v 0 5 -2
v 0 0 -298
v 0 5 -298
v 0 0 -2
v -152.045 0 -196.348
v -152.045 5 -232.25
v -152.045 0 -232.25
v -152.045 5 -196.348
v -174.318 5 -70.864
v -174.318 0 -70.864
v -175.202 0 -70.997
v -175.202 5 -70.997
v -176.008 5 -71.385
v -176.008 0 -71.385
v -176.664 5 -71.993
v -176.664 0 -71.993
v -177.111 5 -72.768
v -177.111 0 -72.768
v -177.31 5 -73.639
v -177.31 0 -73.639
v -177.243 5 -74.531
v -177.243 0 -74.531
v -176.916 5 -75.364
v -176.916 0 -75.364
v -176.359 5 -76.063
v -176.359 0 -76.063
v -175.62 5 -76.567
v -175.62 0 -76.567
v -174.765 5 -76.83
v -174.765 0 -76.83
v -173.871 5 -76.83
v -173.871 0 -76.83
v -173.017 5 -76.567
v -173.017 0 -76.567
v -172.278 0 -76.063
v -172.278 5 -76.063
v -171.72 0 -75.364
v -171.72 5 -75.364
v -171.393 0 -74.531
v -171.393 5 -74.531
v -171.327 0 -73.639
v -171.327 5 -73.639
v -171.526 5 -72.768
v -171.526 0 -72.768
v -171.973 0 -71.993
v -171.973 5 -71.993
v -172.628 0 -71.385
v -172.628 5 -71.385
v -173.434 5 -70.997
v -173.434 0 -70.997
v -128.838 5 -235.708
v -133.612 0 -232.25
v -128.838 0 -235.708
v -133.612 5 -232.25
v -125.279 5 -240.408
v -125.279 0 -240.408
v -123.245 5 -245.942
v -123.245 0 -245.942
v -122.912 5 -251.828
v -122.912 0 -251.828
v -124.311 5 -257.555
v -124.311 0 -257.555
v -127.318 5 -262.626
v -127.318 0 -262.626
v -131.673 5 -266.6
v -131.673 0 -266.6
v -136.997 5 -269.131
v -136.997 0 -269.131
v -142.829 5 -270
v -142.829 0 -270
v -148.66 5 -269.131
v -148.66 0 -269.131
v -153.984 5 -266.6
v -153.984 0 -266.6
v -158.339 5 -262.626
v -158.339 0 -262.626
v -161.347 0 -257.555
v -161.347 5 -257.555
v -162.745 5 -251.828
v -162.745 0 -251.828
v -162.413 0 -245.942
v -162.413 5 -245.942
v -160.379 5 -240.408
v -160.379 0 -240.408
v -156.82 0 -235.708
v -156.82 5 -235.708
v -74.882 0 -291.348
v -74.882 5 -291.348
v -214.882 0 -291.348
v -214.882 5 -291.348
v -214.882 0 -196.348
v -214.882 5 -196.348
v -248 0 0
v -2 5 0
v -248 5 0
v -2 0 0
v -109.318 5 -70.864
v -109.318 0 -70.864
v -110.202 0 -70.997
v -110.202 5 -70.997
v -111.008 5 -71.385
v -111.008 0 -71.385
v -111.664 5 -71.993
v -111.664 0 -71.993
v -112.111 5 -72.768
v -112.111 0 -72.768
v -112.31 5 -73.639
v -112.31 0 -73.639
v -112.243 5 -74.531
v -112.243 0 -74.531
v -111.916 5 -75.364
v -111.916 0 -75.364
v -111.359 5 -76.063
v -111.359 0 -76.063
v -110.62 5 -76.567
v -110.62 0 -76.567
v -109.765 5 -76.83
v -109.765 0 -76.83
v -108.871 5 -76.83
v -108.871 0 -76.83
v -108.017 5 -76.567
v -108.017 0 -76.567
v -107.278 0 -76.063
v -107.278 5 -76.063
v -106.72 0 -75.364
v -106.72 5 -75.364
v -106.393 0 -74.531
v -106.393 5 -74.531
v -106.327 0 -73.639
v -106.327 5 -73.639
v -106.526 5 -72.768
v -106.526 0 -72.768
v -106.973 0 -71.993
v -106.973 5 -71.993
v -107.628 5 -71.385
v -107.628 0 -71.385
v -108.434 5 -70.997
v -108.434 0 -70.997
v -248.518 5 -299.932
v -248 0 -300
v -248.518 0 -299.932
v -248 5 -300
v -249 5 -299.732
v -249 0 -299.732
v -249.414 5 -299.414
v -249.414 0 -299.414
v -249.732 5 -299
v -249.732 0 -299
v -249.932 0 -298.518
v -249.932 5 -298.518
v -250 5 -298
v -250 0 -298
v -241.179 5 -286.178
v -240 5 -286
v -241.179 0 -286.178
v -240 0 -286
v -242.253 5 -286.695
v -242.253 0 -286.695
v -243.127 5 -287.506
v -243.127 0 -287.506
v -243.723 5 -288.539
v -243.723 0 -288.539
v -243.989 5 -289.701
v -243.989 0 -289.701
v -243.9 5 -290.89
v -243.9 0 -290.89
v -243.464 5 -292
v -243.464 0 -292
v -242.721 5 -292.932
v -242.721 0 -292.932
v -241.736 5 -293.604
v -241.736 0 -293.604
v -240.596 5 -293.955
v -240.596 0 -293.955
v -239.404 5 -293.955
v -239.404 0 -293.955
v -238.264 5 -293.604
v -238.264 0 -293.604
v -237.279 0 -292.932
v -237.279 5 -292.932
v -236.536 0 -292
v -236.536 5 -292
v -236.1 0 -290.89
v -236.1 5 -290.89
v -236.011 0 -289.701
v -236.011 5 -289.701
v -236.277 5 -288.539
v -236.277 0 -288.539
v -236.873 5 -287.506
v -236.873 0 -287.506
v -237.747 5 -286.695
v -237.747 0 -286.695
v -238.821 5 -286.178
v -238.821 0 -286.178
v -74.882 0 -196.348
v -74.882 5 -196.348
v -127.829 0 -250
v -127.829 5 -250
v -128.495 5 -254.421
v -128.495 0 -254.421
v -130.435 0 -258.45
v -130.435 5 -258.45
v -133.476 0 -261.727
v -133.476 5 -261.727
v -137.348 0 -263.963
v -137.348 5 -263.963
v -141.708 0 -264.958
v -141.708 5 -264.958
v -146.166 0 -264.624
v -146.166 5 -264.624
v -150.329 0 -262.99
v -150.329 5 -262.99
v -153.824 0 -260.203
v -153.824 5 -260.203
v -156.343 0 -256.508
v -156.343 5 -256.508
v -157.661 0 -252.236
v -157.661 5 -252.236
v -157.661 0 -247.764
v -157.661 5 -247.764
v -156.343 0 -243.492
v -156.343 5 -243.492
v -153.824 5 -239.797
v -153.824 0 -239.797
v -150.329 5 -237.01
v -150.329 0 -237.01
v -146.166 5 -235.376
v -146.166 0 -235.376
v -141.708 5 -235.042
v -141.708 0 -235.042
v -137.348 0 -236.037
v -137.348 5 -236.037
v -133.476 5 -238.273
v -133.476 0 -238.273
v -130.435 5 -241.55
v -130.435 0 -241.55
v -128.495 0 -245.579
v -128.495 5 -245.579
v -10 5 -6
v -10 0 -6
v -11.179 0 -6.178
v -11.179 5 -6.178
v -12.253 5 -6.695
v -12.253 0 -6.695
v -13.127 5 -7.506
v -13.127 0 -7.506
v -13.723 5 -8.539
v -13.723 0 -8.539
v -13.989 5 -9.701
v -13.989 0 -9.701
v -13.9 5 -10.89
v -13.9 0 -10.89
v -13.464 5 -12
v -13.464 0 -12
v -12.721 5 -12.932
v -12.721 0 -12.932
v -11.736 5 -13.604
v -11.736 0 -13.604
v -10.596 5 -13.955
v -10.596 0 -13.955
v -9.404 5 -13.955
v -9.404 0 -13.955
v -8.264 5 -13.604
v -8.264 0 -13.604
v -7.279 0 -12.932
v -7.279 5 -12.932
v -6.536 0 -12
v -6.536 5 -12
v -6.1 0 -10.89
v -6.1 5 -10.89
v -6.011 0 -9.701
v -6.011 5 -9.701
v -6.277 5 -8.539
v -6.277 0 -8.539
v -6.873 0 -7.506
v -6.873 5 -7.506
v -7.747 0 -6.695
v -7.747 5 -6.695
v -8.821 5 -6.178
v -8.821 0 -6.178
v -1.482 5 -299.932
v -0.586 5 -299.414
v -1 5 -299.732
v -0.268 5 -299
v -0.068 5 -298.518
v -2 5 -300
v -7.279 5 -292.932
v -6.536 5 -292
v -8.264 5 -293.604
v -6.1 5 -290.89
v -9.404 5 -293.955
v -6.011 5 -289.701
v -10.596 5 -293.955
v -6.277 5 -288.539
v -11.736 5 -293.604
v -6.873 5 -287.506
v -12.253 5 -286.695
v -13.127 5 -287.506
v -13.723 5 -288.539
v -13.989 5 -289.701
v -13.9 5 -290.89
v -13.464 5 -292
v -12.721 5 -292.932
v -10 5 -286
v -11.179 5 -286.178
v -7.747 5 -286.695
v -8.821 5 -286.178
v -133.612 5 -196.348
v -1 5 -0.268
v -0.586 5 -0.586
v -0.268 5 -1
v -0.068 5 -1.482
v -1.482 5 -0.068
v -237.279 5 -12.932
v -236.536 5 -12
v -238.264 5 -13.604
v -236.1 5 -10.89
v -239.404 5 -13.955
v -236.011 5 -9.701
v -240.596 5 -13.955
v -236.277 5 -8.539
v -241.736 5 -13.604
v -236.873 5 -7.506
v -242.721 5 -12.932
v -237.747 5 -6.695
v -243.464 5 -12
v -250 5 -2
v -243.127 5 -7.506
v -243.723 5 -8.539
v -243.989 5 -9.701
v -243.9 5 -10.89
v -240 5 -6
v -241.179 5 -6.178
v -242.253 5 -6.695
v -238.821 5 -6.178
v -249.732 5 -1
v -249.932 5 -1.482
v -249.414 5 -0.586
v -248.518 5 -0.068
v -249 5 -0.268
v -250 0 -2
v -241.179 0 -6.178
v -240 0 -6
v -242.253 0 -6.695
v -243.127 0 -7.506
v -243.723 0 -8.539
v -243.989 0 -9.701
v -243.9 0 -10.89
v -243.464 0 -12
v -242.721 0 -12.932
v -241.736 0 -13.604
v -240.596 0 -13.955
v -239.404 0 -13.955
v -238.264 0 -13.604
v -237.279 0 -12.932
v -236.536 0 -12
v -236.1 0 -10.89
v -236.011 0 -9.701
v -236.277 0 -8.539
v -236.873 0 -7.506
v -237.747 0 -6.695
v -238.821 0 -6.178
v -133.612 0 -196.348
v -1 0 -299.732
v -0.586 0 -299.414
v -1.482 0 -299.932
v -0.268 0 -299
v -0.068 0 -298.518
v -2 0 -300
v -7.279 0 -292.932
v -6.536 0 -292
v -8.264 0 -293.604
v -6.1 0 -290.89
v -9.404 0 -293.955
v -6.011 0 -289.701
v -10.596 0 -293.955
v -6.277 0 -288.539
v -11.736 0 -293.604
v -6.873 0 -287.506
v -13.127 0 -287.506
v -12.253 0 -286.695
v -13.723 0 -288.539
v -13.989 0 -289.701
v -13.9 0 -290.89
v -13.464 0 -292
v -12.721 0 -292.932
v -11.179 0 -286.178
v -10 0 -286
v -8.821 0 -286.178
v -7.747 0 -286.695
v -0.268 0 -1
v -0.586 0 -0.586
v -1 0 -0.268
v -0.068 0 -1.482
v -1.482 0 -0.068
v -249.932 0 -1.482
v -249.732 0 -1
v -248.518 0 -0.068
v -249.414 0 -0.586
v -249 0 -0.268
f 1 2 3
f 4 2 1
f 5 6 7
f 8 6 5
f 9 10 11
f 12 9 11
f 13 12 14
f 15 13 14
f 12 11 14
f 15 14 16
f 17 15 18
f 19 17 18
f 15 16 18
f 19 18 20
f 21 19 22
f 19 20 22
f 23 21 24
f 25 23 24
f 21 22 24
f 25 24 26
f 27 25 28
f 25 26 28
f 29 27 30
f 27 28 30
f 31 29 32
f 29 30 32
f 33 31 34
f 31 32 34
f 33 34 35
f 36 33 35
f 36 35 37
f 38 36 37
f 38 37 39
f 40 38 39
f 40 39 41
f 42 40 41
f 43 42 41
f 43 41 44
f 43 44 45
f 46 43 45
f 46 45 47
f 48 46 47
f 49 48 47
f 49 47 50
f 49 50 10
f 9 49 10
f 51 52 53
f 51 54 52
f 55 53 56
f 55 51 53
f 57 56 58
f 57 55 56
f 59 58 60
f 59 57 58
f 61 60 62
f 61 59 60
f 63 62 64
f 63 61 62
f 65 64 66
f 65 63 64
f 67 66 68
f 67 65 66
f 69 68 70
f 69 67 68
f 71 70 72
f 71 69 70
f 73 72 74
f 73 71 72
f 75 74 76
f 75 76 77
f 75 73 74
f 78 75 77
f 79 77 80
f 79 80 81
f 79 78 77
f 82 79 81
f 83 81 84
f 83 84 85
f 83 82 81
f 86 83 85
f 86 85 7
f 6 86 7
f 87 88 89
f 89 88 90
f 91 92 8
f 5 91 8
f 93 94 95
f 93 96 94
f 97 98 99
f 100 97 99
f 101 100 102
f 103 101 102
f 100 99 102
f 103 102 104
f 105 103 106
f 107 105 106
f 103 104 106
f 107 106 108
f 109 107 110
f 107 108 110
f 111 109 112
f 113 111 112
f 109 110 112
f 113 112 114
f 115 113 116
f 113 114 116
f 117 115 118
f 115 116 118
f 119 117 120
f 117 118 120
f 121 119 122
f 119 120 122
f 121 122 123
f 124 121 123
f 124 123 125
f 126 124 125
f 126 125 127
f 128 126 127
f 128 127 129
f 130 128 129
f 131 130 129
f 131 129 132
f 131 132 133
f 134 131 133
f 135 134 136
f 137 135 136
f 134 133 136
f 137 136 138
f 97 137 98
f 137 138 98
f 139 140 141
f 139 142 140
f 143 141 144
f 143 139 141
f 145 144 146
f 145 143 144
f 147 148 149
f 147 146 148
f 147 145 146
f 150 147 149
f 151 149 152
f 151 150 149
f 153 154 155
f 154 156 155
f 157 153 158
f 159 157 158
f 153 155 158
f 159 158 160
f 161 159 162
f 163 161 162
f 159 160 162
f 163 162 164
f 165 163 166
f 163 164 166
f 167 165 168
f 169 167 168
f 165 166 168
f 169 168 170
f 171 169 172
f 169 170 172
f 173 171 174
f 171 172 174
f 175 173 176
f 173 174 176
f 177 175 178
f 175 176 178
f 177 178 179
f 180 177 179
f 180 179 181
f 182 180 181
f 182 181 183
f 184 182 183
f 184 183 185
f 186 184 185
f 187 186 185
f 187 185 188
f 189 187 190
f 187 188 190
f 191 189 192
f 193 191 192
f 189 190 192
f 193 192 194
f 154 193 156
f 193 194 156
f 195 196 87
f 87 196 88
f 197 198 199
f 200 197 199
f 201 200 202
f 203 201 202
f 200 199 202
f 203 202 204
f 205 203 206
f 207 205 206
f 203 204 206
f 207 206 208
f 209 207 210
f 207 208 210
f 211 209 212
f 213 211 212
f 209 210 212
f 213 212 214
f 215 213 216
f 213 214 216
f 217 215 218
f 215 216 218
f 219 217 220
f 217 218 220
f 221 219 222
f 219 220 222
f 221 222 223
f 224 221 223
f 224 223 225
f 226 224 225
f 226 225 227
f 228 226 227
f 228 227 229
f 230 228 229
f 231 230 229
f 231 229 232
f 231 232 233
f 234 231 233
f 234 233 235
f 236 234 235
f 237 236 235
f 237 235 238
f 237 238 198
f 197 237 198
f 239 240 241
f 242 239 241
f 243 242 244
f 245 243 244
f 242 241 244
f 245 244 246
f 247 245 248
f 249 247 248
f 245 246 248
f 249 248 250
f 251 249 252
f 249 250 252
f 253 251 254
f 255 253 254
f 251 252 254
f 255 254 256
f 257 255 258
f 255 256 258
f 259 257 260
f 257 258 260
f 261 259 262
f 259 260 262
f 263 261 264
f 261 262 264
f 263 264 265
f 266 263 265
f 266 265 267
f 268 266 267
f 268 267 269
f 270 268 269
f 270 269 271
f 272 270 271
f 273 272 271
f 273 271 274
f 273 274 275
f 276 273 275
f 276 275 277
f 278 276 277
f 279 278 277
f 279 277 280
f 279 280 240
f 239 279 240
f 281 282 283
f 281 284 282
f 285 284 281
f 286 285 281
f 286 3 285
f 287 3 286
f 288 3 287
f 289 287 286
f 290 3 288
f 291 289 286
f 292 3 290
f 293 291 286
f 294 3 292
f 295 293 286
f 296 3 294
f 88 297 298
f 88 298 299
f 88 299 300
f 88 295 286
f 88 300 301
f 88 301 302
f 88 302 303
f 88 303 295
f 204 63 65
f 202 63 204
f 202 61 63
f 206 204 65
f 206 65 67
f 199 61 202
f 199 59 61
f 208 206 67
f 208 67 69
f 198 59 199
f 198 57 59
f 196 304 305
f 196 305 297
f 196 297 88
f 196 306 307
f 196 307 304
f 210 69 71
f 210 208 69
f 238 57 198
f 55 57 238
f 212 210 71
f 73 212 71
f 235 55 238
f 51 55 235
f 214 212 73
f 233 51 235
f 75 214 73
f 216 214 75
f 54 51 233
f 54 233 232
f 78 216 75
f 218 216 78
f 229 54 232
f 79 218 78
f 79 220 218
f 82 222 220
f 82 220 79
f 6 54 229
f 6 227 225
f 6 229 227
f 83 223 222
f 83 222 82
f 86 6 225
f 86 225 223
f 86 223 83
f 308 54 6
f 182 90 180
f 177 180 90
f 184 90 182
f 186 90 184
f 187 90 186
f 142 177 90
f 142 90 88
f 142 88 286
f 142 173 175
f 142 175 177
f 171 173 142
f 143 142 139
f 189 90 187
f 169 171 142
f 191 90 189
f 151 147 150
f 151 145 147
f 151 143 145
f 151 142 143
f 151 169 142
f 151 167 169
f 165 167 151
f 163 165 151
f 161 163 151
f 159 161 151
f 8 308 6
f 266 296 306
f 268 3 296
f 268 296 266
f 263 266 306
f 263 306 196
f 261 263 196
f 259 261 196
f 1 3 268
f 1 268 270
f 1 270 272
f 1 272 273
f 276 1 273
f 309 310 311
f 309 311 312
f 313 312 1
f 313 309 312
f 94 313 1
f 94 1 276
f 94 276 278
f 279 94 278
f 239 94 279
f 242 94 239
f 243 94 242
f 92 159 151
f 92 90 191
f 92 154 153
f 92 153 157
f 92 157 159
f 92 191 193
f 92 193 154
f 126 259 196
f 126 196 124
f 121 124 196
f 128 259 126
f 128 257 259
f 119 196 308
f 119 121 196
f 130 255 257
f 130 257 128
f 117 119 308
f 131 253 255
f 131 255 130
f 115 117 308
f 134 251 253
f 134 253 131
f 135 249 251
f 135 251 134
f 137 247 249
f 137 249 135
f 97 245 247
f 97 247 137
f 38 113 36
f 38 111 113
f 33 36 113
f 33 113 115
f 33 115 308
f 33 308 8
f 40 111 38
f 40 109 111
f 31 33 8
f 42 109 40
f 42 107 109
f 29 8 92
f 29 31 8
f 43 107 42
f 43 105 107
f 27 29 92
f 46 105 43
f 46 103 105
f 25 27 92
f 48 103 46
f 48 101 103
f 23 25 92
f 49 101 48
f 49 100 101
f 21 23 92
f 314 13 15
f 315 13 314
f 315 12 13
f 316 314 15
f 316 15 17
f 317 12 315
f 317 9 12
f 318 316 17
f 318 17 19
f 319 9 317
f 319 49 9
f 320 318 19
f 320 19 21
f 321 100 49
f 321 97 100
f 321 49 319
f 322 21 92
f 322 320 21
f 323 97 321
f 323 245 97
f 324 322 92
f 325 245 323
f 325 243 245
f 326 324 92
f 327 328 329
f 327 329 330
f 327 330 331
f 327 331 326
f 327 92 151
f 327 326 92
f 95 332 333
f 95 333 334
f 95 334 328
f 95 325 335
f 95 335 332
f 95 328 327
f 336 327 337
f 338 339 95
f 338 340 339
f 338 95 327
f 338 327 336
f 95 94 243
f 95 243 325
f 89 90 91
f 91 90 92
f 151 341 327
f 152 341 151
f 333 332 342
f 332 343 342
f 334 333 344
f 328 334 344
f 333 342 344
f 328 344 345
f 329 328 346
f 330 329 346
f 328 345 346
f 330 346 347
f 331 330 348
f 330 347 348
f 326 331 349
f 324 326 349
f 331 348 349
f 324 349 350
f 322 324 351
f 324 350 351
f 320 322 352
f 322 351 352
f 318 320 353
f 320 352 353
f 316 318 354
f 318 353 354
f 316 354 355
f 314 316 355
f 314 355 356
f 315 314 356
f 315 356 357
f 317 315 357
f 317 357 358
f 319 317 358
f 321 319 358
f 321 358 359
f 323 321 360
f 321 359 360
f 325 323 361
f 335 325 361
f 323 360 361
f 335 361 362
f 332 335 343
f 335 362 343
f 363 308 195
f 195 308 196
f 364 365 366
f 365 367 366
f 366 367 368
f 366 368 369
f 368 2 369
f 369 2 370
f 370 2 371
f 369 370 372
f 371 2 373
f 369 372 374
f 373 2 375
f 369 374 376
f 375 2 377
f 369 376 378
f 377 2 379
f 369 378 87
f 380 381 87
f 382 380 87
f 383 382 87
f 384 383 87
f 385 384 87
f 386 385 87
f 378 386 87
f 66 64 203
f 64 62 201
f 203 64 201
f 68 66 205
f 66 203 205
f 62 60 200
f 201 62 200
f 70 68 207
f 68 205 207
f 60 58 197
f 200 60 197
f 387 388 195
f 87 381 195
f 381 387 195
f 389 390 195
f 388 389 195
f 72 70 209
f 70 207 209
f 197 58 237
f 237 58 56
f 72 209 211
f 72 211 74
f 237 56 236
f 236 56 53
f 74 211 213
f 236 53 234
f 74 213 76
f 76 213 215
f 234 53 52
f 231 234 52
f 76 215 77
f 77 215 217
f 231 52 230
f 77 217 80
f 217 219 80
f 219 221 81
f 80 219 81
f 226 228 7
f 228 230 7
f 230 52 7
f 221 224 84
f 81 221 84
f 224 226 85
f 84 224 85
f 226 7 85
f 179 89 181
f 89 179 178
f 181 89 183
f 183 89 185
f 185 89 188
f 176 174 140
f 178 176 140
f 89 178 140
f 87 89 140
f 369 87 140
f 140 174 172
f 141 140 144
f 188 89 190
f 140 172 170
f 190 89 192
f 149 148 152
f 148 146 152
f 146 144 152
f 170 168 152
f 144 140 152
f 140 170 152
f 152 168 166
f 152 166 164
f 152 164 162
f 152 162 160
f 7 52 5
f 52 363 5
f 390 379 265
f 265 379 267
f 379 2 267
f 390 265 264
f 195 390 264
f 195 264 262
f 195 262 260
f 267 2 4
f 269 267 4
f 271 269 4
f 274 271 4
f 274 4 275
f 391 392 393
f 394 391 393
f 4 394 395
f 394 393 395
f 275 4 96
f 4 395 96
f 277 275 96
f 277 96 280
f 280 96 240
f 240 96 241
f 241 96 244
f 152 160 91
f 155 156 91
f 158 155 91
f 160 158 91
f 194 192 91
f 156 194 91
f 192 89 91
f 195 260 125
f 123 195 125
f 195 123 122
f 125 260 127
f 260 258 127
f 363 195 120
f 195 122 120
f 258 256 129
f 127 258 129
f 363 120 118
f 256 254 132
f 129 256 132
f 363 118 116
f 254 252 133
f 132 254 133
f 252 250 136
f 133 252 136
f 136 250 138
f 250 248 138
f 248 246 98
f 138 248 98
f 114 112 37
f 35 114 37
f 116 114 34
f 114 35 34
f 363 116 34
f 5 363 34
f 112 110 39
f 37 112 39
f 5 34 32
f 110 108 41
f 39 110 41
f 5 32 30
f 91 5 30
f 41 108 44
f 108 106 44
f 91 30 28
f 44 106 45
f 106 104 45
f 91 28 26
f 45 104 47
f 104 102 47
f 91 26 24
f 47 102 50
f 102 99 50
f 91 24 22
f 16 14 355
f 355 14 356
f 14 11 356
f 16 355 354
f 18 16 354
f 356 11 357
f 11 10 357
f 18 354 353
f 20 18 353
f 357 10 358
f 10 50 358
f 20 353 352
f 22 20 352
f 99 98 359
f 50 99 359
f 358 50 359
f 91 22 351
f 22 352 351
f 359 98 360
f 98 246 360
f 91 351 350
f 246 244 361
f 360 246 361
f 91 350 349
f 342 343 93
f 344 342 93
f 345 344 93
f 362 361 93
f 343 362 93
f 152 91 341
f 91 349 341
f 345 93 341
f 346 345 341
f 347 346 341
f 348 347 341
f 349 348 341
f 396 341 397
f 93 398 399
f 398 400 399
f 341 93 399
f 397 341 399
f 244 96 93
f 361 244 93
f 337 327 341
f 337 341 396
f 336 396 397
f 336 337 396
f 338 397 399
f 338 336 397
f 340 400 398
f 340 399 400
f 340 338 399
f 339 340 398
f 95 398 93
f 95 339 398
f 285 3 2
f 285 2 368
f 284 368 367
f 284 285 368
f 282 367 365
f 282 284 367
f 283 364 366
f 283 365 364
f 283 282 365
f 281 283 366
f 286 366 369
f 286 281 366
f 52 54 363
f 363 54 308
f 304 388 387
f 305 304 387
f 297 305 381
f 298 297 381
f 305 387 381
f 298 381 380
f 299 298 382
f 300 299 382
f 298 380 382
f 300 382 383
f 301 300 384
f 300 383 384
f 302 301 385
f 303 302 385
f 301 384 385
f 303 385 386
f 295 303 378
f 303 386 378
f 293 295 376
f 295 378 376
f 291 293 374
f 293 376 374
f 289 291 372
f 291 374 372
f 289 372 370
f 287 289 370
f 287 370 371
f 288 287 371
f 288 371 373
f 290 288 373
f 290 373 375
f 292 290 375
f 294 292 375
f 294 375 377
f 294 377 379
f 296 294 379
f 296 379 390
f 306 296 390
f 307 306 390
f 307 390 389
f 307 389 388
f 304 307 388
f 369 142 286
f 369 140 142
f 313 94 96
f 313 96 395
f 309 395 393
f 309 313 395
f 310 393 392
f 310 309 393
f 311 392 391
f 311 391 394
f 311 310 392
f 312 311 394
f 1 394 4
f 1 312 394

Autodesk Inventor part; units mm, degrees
ref_plane "YZ Plane" through (0, 0, 0) normal (1, 0, 0) x (0, 1, 0)
ref_plane "XZ Plane" through (0, 0, 0) normal (0, 1, 0) x (-1, 0, 0)
ref_plane "XY Plane" through (0, 0, 0) normal (0, 0, 1) x (1, 0, 0)
sketch "Sketch2" plane through (0, 0, 0) normal (0, 1, 0) x (-1, 0, 0)
  line L0 (0, 0) -> (250, 0)
  line L1 (250, 0) -> (250, -300)
  line L2 (250, -300) -> (0, -300)
  line L3 (0, -300) -> (0, 0)
  dimension "d4" = 250
  dimension "d5" = 300
extrude "Extrusion2" add sketch "Sketch2" along normal blind 5
fillet "Fillet1" radius 2 4 edges at (0, 2.5, 0) (-250, 2.5, 0) (-250, 2.5, -300) (0, 2.5, -300)
sketch "Sketch5" plane through (0, 5, 0) normal (0, 1, 0) x (1, 0, 0)
  line L0 (-2, 300) -> (-248, 300) projected
  circle A0 centre (-10, 10) radius 5 projected
  circle A1 centre (-10, 290) radius 5 projected
  circle A2 centre (-240, 290) radius 5 projected
  circle A3 centre (-240, 10) radius 5 projected
  point P0 (0, 0)
  point P1 (-15, 150)
  dimension "d25" = 150
hole "Hole1" at (-240, 5, -10) at (-10, 5, -10) at (-10, 5, -290) at (-240, 5, -290) direction (0, -1, 0) diameter 8 depth 25 tip angle 118
sketch "Sketch6" plane through (0, 5, 0) normal (0, 1, 0) x (1, 0, 0)
  circle A0 centre (-142.8286, 250) radius 15
  line L0 (-2, 300) -> (-248, 300) projected
  circle A1 centre (-142.8286, 250) radius 20
  line L1 (-133.6124, 232.25) -> (-133.6124, 196.3478)
  line L2 (-152.0448, 232.25) -> (-152.0448, 196.3478)
  line L3 (-214.8824, 196.3478) -> (-74.8824, 196.3478)
  line L4 (-74.8824, 196.3478) -> (-74.8824, 291.3478)
  line L5 (-74.8824, 291.3478) -> (-214.8824, 291.3478)
  line L6 (-214.8824, 291.3478) -> (-214.8824, 196.3478)
  point P0 (0, 0)
  dimension "d33" = 30
  dimension "d34" = 50
  dimension "d35" = 40
  dimension "d36" = 140
  dimension "d37" = 95
extrude "Extrusion5" cut sketch "Sketch6" against normal blind 50 contours A0 | A1 L2 L3 L6 L5 L4 L1
sketch "Sketch8" plane through (0, 5, 0) normal (0, 1, 0) x (1, 0, 0)
  line L0 (-152.0448, 196.3478) -> (-214.8824, 196.3478) projected
  line L1 (-133.6124, 196.3478) -> (-74.8824, 196.3478) projected
  point P0 (0, 0)
  point P1 (-174.2431, 196.3478)
  point P2 (-174.3182, 73.8636)
  point P3 (-109.2711, 196.3478)
  point P4 (-109.3182, 73.8636)
  dimension "d47" = 65
hole "Hole3" at (-174.3182, 5, -73.8636) at (-109.3182, 5, -73.8636) direction (0, -1, 0) diameter 6 depth 25 tip angle 118
properties part number "bevel desk (hole)" material "Lead"
